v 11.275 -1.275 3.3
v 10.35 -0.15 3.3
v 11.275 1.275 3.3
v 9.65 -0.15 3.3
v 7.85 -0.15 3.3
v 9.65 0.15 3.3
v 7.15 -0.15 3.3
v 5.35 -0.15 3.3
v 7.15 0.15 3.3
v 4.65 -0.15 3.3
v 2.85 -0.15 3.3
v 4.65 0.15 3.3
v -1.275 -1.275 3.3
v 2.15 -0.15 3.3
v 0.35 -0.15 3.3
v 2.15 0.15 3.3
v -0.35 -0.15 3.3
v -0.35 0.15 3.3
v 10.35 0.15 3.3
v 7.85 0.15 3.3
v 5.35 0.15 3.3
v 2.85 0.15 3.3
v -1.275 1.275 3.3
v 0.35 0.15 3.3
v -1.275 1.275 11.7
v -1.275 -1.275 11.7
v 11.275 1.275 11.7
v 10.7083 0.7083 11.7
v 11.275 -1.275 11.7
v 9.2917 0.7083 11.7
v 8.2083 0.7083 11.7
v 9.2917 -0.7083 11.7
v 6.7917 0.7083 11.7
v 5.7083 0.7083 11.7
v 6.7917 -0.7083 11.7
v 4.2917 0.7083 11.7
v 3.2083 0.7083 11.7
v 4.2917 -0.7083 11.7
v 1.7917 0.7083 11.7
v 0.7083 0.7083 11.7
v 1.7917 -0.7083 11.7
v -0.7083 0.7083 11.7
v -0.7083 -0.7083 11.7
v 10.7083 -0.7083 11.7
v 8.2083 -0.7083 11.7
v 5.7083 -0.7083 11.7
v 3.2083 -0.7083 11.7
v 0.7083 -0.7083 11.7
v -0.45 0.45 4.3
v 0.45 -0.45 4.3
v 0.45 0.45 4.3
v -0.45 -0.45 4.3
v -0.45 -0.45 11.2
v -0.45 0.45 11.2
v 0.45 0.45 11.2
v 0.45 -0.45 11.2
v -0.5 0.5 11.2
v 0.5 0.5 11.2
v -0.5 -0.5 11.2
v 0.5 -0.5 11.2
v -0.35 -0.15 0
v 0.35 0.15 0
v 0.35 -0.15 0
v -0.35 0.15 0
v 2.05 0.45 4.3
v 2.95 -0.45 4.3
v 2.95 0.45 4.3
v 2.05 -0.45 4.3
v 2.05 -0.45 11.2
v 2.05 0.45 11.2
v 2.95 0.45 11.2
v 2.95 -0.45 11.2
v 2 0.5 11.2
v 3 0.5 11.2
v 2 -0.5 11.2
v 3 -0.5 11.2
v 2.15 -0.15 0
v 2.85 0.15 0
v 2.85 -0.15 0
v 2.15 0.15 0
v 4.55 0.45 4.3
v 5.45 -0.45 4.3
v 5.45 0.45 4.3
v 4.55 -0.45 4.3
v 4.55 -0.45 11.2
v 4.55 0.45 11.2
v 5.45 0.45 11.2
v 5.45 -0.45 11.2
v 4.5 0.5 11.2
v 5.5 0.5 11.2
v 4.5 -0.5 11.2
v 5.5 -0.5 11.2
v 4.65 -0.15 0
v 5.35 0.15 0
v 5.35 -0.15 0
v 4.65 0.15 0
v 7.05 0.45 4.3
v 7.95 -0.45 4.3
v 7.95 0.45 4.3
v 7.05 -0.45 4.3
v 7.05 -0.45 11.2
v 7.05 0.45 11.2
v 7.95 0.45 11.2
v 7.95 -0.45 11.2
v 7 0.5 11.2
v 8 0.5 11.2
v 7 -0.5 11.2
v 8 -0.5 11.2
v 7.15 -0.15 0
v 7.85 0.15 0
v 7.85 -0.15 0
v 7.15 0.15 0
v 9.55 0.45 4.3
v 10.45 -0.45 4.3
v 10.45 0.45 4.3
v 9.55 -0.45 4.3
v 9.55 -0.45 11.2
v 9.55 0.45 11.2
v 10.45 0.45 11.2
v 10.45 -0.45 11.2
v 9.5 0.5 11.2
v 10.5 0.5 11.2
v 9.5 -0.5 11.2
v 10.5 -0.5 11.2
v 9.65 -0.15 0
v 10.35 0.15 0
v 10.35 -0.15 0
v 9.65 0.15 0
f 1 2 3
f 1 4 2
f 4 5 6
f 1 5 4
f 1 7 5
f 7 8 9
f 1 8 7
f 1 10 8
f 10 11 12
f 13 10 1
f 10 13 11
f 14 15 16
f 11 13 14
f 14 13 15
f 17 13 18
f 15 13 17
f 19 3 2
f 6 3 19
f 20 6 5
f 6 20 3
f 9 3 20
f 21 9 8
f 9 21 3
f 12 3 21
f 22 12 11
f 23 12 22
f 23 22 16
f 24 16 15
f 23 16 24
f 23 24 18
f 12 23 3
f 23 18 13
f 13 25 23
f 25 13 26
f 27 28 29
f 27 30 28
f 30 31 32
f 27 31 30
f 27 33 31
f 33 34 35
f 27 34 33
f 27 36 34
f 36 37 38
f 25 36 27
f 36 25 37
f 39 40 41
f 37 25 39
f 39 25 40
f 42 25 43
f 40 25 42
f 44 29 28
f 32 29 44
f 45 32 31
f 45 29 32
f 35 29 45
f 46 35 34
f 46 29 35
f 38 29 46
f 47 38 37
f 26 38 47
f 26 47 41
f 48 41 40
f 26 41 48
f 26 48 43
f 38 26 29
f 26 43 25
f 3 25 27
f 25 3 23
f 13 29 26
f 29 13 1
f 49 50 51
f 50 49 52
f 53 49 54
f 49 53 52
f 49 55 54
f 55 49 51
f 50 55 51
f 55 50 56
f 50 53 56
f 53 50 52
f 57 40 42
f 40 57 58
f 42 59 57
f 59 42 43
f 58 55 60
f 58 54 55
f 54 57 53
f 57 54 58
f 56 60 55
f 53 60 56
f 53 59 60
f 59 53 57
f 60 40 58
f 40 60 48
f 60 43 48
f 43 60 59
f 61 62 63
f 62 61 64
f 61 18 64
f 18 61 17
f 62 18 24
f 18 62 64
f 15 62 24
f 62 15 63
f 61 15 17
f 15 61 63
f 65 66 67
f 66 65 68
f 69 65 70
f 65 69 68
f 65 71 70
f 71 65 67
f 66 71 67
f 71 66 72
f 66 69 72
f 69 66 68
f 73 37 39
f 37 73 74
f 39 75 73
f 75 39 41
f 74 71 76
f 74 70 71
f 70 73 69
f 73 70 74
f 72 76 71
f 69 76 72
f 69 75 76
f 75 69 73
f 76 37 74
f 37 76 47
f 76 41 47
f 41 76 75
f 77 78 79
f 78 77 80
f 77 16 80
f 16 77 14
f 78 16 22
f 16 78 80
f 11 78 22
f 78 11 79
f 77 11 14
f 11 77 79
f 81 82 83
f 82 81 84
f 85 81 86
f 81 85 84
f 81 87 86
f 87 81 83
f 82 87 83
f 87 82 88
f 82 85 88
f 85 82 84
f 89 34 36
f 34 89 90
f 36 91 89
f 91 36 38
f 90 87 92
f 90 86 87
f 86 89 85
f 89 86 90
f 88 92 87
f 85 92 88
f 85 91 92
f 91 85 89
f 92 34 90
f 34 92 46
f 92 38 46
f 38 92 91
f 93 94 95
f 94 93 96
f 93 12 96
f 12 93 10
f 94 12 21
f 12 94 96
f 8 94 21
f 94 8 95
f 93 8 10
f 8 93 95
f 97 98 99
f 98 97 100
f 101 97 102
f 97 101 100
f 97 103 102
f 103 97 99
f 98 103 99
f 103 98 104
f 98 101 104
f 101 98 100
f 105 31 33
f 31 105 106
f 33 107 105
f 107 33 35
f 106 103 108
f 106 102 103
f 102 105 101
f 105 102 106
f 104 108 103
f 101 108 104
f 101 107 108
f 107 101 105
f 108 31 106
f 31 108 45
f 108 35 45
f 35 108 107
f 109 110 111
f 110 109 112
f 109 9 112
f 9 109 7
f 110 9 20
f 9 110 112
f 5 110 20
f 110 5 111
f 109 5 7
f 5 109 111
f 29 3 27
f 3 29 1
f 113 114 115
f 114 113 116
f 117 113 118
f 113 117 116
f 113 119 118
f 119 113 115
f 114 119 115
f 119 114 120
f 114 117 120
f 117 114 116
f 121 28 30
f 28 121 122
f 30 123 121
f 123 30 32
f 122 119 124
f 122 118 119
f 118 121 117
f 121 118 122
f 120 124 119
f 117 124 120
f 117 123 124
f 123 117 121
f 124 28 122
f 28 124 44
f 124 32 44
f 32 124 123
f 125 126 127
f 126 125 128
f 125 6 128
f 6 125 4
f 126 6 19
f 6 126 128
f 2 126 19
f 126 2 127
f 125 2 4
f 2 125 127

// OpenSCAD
sq_size = 2.5;
plastic_height=8.4;
size_mod = 0.05; // to ensure the shapes actually overlap not 
                // exactly touch

module one_connector(){
    translate([0,0,3.3]){
        difference(){
            linear_extrude(height=plastic_height){
                square(sq_size+size_mod,center=true);
            }
            translate([0,0,1]){
                linear_extrude(height=plastic_height+1){
                    square(0.9,center=true);
                }
            }
            translate([0,0,plastic_height-0.5]){
                linear_extrude(height=0.6,scale=1.5){
                    square(1.0,center=true);
                }
            }
        }
    }
    linear_extrude(height=3.4){
        square([0.7,0.3],center=true);
    }
}

//one_connector();

module multi_female_connector(conn_count){
    for (cc=[0 : conn_count-1] ){
        translate([((cc*sq_size)),0,0]){
            one_connector();
        }
    }

}

multi_female_connector(5);
